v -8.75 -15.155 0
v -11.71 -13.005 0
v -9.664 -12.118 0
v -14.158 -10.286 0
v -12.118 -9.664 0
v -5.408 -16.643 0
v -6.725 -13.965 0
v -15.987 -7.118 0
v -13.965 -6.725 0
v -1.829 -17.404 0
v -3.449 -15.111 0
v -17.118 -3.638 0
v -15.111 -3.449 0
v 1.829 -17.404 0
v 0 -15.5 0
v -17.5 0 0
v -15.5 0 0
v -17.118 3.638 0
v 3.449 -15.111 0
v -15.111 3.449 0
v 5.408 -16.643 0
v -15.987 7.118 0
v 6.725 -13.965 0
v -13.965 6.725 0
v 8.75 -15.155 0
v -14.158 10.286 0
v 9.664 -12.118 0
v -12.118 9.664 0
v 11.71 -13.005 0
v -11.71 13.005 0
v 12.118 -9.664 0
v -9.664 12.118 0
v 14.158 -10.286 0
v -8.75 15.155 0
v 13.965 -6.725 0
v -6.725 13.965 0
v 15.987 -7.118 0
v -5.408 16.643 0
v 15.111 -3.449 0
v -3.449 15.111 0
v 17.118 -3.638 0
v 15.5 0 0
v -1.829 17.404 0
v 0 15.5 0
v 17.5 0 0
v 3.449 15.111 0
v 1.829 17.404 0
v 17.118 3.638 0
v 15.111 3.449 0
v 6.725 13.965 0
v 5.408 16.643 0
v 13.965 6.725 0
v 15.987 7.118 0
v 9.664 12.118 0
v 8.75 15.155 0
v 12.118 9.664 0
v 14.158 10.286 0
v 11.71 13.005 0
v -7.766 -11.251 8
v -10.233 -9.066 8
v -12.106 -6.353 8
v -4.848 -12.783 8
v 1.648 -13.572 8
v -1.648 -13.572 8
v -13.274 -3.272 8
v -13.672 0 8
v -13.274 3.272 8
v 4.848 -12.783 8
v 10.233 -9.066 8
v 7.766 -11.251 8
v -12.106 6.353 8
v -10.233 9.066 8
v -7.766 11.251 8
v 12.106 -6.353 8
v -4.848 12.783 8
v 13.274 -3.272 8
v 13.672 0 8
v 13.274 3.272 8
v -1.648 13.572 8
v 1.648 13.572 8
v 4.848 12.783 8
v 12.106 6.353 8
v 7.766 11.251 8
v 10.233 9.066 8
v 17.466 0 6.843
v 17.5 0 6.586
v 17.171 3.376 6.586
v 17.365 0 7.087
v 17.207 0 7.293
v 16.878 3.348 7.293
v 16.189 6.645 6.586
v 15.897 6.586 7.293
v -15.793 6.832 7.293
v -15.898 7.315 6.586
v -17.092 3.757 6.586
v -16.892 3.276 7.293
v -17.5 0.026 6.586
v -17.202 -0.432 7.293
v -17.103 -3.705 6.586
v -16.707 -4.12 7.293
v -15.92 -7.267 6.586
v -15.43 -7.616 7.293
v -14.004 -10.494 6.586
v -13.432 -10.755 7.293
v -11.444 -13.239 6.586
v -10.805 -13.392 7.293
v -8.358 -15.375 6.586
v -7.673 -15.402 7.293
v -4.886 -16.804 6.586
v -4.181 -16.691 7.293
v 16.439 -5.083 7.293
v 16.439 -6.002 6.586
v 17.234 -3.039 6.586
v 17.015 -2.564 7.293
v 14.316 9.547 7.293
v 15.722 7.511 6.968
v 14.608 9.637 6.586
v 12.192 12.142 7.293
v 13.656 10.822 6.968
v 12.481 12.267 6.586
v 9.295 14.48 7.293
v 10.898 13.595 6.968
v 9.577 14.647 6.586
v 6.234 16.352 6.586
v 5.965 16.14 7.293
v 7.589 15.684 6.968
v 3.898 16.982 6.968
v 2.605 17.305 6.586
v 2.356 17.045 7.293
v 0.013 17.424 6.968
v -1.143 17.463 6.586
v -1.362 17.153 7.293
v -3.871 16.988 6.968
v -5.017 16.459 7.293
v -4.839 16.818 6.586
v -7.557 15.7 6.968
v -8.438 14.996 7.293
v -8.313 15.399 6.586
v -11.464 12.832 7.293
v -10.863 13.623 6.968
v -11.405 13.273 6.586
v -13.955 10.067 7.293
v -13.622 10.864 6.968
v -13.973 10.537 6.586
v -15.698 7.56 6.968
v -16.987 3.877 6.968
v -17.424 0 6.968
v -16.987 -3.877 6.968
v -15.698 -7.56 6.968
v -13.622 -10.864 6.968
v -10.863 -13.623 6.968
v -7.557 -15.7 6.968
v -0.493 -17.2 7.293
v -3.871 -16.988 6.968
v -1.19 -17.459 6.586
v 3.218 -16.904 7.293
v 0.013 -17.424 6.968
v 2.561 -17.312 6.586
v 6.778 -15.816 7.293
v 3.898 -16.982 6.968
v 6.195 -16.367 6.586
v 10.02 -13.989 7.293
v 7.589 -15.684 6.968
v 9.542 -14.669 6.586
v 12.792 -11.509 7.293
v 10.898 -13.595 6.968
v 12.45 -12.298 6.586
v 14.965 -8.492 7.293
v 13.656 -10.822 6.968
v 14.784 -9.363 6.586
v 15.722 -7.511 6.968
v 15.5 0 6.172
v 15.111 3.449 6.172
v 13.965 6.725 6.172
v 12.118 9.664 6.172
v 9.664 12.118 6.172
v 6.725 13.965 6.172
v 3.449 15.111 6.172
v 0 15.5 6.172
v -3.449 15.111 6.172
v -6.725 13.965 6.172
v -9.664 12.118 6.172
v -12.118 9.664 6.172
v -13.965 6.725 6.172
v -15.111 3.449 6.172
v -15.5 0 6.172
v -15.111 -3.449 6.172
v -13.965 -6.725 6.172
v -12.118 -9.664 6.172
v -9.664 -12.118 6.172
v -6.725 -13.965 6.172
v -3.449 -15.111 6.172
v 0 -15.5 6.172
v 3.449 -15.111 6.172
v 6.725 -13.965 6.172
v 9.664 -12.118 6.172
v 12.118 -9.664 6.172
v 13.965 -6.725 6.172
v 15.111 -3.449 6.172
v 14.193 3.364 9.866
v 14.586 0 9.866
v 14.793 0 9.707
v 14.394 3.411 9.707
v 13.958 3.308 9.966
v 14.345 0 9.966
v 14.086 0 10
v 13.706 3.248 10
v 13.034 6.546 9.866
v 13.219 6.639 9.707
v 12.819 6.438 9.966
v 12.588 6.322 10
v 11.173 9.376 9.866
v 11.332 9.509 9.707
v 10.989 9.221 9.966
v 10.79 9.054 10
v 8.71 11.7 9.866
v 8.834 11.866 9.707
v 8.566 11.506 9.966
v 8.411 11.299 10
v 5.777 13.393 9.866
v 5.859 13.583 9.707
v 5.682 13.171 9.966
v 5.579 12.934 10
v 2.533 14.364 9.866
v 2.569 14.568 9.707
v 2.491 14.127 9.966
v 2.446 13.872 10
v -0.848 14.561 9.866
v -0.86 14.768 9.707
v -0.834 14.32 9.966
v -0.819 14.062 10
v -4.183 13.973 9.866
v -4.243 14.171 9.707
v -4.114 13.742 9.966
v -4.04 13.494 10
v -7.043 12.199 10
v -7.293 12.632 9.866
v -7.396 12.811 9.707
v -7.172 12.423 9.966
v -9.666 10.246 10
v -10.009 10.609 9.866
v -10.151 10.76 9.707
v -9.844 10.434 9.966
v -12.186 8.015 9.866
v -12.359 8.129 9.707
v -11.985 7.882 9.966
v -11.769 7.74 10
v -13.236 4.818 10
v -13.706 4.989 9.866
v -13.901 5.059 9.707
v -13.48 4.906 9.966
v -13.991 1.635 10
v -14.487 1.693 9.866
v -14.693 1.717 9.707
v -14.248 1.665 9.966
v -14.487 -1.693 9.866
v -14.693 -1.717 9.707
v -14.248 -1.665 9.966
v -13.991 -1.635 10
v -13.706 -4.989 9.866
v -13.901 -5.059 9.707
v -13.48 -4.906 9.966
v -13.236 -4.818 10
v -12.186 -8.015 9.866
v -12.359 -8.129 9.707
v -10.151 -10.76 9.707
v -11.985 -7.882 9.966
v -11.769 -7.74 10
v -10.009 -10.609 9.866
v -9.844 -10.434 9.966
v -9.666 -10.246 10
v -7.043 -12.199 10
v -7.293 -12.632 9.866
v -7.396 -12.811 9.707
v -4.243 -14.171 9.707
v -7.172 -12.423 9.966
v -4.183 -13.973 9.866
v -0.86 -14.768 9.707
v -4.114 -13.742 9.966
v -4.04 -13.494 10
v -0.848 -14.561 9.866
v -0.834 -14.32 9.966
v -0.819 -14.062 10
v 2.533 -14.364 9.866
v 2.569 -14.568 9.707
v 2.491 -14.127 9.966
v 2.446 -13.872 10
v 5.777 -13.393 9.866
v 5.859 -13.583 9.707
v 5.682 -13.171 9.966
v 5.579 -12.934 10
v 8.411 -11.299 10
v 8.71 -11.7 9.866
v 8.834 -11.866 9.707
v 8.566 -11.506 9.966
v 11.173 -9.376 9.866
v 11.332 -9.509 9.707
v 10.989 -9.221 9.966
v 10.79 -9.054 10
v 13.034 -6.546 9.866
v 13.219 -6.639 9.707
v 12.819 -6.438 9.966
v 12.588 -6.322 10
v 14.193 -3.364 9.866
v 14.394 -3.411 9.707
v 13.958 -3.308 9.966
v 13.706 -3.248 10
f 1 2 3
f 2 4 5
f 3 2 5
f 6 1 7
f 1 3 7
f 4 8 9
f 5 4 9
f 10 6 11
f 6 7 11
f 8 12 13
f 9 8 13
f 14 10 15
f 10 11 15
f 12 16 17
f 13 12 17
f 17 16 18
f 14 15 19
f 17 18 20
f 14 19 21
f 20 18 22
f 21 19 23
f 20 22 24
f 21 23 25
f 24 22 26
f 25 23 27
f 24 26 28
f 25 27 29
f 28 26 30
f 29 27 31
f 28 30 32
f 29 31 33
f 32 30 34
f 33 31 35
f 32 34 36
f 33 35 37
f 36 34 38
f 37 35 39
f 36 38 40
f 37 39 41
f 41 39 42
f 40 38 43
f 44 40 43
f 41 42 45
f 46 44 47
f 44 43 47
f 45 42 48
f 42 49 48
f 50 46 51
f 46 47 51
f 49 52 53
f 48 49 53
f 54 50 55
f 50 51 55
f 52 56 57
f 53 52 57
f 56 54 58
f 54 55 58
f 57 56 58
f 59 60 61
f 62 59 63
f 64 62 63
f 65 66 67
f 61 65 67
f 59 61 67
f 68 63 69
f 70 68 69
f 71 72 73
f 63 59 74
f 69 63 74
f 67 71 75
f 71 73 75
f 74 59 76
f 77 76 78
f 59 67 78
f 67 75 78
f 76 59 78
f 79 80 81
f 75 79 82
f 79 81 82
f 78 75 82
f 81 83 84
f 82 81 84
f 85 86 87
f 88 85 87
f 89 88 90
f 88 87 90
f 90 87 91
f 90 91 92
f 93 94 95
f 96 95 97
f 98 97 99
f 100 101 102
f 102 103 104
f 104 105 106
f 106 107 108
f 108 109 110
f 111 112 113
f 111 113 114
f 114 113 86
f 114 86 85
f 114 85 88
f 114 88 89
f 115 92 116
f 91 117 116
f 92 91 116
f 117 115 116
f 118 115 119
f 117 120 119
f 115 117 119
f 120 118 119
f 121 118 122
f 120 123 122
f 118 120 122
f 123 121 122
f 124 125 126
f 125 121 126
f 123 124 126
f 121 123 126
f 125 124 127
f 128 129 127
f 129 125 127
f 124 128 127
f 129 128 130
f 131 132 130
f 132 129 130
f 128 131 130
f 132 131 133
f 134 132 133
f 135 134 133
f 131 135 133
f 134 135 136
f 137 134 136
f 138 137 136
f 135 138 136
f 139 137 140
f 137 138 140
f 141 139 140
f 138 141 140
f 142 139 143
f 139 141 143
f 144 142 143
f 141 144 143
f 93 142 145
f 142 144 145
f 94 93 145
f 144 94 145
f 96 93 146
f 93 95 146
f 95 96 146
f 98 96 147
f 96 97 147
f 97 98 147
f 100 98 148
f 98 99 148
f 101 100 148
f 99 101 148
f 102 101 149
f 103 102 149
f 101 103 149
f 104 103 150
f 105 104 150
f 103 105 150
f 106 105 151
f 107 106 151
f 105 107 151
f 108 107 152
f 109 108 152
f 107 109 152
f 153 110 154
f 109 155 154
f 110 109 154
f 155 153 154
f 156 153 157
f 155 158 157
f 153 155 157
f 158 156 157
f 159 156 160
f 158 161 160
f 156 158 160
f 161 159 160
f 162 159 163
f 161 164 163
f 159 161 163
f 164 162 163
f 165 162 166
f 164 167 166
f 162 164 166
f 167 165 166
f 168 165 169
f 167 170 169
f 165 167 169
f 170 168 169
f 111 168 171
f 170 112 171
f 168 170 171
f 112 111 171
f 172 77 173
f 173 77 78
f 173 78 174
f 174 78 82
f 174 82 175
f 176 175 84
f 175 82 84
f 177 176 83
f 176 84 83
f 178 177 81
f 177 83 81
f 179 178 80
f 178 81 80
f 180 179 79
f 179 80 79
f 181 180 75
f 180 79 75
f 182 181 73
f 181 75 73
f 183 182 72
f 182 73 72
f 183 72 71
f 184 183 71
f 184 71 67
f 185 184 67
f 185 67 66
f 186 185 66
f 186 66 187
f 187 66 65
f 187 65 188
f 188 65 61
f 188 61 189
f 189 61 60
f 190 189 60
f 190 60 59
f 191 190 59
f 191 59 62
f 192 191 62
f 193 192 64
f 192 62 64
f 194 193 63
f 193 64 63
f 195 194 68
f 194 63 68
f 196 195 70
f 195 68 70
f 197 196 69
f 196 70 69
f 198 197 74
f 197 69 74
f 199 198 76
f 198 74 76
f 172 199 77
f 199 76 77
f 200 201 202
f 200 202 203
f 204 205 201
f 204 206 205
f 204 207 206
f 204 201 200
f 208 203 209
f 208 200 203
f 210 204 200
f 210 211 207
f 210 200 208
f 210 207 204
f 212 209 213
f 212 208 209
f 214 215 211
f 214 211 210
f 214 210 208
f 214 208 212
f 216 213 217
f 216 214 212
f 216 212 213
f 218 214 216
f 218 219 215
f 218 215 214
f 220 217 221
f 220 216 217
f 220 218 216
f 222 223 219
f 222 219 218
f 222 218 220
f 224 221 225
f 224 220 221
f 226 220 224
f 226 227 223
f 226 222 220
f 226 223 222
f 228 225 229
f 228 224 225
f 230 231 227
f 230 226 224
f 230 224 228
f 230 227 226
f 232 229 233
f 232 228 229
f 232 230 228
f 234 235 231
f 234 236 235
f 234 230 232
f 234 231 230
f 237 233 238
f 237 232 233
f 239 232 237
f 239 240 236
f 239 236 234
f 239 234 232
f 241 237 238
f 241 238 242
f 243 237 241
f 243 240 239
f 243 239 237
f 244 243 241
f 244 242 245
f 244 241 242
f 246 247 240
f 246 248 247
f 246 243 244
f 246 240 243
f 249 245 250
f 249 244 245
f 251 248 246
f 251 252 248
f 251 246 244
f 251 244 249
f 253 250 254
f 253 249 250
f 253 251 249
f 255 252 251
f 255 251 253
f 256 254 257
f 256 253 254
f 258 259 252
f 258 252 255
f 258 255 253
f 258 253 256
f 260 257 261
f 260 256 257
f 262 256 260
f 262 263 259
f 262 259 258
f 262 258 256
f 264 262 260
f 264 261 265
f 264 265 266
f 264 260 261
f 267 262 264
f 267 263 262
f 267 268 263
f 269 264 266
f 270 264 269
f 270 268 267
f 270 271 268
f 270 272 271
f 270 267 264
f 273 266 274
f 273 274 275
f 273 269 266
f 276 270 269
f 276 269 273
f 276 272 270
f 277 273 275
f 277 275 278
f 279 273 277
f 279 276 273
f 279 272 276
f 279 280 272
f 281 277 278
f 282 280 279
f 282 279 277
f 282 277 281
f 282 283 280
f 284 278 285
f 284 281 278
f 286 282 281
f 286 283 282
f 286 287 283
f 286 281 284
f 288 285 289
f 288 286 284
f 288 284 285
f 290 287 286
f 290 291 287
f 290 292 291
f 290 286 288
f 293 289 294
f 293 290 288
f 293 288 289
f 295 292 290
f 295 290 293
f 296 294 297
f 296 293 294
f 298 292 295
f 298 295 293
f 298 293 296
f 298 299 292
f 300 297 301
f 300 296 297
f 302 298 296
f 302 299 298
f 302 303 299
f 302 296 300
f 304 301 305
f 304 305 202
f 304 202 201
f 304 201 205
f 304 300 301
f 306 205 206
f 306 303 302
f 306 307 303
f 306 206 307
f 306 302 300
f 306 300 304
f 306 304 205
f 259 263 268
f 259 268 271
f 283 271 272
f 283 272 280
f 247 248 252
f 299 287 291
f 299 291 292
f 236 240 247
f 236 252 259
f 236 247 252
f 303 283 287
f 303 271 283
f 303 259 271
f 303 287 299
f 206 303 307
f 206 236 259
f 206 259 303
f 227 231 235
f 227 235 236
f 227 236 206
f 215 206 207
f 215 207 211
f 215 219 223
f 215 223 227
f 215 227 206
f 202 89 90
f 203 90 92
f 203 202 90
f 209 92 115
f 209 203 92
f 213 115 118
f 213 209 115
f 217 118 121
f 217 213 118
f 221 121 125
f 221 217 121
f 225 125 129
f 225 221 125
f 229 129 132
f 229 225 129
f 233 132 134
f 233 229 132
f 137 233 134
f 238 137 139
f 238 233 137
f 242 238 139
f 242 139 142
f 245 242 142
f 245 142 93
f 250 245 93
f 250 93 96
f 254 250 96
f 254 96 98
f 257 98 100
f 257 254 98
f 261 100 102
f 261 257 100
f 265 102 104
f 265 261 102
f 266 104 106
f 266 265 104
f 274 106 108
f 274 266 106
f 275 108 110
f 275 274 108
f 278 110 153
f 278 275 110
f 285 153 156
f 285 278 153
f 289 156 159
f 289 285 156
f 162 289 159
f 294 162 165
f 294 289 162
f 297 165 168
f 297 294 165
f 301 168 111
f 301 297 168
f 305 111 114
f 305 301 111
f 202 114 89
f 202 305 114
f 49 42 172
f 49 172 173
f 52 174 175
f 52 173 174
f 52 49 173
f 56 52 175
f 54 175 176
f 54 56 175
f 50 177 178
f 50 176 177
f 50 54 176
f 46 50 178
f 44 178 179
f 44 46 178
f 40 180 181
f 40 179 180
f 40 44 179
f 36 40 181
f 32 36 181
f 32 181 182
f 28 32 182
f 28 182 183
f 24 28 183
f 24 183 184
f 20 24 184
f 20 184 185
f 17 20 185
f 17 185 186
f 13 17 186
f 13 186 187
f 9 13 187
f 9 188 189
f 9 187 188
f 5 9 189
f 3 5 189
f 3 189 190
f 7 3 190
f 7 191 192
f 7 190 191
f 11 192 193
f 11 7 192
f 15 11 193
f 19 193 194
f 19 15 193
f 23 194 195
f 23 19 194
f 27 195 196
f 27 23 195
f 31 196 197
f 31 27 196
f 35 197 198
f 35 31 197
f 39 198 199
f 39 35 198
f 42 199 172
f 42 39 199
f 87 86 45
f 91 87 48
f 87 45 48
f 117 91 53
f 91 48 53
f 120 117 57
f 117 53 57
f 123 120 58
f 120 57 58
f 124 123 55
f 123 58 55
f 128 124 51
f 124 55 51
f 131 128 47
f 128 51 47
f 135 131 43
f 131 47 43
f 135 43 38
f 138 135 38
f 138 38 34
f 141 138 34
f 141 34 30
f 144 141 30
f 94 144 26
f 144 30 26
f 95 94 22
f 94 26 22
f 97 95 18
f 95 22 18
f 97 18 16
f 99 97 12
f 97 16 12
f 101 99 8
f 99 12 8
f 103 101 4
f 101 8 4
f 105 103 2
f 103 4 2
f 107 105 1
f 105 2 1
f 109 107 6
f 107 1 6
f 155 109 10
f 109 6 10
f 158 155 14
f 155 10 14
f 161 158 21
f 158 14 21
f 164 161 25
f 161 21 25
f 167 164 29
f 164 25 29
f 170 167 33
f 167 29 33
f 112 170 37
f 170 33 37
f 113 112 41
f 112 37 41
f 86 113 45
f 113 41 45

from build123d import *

# Parameters (mm, degrees)
F0_R     = 17.5
F1_DEPTH = 10
F2_SIZE  = 3
F3_R     = 1
F4_T     = -2


with BuildPart() as f1:
    # F0 (on Top) → F1 (new body)
    with BuildSketch(Plane.XY):
        Circle(F0_R)
    extrude(amount=F1_DEPTH)

    # F2
    f2_edges = [f1.edges().sort_by_distance(p)[0] for p in [
        (-17.5, 0, 10),
    ]]
    chamfer(f2_edges, length=F2_SIZE)

    # F3
    f3_edges = [f1.edges().sort_by_distance(p)[0] for p in [
        (16, 0, 8.5),
        (-17.5, 0, 7),
        (-14.5, 0, 10),
    ]]
    fillet(f3_edges, radius=F3_R)

    # F4
    f4_openings = [f1.faces().sort_by_distance(p)[0] for p in [
        (0, 0, 0),
    ]]
    offset(amount=F4_T, openings=f4_openings)


solid = f1.part
